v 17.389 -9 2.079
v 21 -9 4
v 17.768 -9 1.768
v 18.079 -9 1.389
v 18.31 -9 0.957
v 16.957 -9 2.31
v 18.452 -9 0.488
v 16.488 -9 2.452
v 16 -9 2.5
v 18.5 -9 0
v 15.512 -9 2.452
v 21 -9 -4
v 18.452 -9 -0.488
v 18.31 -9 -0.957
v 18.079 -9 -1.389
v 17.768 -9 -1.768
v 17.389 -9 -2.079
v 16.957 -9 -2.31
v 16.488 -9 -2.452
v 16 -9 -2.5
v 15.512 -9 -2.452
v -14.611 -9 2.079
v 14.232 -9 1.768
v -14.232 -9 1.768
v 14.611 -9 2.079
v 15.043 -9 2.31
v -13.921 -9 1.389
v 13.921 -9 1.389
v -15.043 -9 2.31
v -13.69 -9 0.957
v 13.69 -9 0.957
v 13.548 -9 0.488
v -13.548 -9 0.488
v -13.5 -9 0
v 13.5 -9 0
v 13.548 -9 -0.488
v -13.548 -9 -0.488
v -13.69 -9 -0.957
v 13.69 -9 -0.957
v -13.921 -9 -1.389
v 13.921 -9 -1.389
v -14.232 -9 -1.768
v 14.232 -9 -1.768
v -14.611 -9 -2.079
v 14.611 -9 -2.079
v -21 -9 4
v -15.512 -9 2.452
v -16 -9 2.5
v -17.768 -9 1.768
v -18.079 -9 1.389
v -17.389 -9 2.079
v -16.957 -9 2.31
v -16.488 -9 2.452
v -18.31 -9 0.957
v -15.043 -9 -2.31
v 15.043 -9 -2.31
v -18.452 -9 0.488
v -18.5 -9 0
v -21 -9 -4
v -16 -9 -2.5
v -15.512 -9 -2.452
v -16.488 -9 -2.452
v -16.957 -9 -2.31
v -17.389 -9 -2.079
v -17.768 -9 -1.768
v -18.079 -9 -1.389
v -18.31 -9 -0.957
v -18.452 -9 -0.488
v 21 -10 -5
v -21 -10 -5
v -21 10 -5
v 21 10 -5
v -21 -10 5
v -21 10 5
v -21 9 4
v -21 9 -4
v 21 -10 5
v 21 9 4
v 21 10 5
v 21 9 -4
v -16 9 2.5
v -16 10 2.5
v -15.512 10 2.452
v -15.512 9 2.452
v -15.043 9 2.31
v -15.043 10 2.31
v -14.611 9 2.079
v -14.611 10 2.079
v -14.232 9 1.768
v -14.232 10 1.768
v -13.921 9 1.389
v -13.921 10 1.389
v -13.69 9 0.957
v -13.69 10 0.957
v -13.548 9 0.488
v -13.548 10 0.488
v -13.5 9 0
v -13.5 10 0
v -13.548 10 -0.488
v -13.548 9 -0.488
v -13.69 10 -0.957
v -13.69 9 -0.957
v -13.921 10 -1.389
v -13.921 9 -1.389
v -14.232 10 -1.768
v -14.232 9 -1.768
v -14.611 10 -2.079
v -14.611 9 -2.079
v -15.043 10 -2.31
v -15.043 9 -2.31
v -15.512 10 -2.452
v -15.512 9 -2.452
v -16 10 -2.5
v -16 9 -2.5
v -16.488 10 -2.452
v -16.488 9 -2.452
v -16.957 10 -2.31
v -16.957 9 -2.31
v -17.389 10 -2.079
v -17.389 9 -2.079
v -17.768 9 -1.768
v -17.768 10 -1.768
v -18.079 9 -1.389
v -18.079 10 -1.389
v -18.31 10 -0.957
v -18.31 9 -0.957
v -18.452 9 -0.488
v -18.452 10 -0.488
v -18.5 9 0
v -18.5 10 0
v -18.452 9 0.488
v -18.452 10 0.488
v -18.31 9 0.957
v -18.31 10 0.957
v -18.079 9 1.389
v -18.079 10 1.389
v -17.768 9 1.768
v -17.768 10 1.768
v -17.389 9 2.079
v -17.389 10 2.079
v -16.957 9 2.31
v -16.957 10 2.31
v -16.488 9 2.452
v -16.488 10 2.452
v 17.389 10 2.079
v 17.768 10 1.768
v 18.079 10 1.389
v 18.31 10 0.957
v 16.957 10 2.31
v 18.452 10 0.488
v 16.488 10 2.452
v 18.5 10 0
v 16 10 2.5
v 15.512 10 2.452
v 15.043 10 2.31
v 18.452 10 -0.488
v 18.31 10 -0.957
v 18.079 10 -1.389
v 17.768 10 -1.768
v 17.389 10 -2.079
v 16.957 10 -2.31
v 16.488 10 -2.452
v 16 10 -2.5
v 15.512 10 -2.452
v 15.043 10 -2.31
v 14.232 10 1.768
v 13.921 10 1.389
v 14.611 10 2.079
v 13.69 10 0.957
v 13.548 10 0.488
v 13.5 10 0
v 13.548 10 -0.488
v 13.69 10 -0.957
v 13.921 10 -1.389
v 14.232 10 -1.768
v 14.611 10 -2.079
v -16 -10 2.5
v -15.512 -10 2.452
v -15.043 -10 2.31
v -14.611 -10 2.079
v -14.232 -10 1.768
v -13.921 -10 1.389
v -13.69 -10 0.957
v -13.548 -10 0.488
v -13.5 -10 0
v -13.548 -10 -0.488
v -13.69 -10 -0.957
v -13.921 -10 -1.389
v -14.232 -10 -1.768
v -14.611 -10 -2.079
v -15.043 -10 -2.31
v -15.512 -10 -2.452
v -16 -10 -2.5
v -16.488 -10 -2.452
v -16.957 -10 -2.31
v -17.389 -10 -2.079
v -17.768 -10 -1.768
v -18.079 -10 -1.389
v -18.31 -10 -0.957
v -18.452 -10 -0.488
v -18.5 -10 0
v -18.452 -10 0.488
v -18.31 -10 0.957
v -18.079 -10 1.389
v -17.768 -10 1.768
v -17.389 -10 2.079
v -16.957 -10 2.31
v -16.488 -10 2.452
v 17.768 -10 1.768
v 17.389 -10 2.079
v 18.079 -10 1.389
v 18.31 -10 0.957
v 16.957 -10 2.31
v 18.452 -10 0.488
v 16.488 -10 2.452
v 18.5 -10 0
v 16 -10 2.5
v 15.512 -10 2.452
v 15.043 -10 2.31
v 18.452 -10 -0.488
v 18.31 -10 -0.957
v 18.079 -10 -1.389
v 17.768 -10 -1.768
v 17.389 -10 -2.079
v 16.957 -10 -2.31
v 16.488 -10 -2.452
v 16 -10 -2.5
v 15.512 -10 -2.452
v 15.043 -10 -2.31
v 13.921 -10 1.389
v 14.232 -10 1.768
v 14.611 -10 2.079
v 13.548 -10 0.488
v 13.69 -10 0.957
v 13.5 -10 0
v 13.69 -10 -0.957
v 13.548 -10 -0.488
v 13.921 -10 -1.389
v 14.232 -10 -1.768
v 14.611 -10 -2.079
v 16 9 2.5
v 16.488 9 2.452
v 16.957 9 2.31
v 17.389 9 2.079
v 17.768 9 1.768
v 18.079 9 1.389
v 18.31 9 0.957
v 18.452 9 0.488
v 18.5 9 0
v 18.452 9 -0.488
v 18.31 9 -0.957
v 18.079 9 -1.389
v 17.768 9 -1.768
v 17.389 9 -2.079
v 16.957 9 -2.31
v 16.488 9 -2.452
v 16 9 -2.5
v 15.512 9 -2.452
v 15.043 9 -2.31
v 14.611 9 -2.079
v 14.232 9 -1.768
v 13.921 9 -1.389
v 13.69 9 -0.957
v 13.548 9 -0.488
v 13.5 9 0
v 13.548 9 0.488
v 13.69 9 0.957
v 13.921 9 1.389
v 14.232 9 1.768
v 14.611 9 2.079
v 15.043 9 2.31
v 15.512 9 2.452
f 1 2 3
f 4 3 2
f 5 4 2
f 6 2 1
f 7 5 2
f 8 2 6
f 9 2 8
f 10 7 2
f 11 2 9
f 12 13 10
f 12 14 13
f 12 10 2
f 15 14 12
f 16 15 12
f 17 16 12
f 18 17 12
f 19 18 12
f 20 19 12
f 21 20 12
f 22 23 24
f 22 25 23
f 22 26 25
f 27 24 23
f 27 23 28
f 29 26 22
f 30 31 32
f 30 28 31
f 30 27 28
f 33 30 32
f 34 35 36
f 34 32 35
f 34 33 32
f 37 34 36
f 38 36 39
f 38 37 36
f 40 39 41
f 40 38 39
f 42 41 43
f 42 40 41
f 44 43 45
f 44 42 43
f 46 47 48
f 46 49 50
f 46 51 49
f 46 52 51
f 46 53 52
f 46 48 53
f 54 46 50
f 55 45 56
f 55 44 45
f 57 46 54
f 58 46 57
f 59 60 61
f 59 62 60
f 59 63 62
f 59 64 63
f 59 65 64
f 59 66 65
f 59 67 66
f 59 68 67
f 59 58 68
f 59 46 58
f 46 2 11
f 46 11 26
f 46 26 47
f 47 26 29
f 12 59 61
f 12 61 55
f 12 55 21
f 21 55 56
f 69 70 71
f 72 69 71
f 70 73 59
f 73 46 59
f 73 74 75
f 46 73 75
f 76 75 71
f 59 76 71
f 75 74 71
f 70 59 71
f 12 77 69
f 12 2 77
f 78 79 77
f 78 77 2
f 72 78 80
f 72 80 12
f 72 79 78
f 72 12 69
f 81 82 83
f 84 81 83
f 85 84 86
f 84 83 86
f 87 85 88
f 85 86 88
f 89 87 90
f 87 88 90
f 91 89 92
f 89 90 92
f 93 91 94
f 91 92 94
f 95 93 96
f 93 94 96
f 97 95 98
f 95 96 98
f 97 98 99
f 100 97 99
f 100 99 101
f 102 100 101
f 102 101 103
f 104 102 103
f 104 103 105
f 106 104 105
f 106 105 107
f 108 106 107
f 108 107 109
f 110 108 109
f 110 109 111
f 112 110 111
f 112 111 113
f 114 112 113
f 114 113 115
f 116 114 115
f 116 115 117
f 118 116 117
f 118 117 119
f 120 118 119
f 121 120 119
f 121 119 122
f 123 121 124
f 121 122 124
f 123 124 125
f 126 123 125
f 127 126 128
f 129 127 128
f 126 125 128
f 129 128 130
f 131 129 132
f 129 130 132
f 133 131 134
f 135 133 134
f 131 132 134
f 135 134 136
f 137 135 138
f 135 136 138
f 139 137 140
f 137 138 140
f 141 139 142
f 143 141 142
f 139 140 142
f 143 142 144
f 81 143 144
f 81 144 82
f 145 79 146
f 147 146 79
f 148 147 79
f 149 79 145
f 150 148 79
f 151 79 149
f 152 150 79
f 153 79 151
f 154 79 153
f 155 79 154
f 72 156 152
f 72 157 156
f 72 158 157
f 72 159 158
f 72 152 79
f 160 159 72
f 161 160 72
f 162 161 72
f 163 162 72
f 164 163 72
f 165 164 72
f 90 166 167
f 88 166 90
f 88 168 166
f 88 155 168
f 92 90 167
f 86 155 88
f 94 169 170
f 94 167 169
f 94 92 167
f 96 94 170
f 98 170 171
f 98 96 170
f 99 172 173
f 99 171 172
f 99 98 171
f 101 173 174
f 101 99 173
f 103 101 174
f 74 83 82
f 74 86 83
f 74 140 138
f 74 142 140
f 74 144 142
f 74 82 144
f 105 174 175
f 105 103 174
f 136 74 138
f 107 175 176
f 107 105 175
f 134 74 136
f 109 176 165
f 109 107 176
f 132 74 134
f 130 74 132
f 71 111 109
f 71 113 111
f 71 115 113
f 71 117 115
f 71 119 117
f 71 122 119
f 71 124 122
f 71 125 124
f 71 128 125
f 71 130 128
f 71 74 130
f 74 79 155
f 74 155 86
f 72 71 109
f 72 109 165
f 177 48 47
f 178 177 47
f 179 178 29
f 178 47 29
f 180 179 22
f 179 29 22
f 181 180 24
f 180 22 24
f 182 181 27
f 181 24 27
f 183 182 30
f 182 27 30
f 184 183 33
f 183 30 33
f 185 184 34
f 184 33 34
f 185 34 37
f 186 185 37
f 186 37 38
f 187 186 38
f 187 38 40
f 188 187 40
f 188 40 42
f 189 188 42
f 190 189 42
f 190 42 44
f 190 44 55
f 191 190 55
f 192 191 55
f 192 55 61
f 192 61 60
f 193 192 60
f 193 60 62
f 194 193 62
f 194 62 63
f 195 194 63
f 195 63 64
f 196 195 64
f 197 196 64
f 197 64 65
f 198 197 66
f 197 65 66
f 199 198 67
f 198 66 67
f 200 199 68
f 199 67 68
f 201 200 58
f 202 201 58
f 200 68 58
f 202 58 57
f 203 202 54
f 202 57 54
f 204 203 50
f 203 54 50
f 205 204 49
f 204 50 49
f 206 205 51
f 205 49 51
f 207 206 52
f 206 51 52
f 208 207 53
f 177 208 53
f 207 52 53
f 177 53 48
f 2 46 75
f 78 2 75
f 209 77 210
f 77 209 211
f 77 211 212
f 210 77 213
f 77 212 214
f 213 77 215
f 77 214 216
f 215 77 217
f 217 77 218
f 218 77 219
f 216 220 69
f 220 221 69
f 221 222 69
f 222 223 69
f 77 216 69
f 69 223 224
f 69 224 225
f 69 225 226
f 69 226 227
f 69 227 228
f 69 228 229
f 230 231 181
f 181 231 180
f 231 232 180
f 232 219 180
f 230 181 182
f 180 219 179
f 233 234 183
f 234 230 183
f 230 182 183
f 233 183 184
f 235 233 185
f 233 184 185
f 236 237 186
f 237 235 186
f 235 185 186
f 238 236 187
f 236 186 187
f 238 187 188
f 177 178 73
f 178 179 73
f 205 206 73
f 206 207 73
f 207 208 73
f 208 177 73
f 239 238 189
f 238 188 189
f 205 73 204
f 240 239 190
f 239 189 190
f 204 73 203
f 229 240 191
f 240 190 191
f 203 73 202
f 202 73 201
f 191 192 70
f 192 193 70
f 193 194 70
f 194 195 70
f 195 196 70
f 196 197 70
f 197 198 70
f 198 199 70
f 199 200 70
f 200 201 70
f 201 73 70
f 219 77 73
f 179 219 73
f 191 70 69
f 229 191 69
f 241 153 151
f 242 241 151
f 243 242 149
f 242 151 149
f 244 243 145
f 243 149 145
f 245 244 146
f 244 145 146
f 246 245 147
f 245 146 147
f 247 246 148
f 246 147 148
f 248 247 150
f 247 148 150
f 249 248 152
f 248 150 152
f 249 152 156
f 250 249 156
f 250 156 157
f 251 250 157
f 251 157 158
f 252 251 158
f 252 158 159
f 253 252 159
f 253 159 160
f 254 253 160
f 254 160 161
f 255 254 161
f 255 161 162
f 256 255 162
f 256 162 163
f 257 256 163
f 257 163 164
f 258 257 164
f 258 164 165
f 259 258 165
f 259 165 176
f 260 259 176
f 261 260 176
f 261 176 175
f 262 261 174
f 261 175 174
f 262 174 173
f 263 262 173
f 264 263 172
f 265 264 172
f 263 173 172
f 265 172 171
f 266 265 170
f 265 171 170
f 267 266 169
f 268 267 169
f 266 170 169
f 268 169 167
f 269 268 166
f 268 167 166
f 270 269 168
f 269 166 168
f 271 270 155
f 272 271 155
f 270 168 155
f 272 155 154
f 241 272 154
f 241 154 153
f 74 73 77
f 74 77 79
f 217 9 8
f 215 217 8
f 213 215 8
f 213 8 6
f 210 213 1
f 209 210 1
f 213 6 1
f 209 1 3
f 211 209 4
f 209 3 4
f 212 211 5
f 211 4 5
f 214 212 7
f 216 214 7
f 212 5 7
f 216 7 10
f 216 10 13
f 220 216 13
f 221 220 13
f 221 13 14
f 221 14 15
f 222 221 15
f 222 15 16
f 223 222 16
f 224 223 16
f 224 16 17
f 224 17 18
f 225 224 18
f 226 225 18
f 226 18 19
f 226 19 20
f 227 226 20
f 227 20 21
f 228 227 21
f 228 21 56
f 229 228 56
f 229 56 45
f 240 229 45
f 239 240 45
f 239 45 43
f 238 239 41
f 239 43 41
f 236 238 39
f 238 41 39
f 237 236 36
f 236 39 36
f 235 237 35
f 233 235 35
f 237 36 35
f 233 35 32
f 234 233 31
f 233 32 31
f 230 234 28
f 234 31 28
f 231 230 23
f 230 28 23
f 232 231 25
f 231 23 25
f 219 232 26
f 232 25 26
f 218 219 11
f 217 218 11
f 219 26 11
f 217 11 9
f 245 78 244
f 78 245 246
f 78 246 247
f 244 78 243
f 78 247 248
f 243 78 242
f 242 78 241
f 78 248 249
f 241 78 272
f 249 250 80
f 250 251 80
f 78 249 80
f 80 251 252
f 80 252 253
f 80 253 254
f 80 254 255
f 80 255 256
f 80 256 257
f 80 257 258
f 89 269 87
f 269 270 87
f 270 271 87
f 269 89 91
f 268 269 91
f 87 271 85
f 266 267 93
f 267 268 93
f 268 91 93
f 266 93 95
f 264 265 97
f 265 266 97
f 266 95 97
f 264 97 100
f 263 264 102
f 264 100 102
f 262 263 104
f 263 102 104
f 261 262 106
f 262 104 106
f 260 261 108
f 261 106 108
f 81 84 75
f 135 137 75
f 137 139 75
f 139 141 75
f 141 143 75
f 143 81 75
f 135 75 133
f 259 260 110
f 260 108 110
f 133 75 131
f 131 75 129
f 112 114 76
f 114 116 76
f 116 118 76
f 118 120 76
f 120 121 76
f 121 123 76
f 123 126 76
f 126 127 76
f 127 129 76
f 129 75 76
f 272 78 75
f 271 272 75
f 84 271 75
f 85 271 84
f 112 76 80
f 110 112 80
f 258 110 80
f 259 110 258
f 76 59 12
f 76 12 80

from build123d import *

# Parameters (mm, degrees)
BOSS_EXTRUDE1_DEPTH      = 21
BOSS_EXTRUDE1_DEPTH_BACK = 21
SKETCH1_W                = 10
SKETCH1_H                = 20
SKETCH1_W_2              = 8
SKETCH1_H_2              = 18
SKETCH2_R                = 2.5
CUT_EXTRUDE1_DEPTH       = 20


with BuildPart() as part:
    # Sketch1 → Boss-Extrude1 (new, two sides: drawn at the far end of the back side and taken through both)
    with BuildSketch(Plane(origin=(0, 0, 0), x_dir=(0, 0, -1), z_dir=(1, 0, 0)).offset(-BOSS_EXTRUDE1_DEPTH_BACK)):
        Rectangle(SKETCH1_W, SKETCH1_H)
        Rectangle(SKETCH1_W_2, SKETCH1_H_2, mode=Mode.SUBTRACT)
    extrude(amount=BOSS_EXTRUDE1_DEPTH + BOSS_EXTRUDE1_DEPTH_BACK)

    # Sketch2 → Cut-Extrude1 (cut)
    with BuildSketch(Plane(origin=(0, 10, 0), x_dir=(1, 0, 0), z_dir=(0, 1, 0))):
        with Locations((-16, 0)):
            Circle(SKETCH2_R)
        with Locations((16, 0)):
            Circle(SKETCH2_R)
    extrude(amount=-CUT_EXTRUDE1_DEPTH, mode=Mode.SUBTRACT)


solid = part.part
